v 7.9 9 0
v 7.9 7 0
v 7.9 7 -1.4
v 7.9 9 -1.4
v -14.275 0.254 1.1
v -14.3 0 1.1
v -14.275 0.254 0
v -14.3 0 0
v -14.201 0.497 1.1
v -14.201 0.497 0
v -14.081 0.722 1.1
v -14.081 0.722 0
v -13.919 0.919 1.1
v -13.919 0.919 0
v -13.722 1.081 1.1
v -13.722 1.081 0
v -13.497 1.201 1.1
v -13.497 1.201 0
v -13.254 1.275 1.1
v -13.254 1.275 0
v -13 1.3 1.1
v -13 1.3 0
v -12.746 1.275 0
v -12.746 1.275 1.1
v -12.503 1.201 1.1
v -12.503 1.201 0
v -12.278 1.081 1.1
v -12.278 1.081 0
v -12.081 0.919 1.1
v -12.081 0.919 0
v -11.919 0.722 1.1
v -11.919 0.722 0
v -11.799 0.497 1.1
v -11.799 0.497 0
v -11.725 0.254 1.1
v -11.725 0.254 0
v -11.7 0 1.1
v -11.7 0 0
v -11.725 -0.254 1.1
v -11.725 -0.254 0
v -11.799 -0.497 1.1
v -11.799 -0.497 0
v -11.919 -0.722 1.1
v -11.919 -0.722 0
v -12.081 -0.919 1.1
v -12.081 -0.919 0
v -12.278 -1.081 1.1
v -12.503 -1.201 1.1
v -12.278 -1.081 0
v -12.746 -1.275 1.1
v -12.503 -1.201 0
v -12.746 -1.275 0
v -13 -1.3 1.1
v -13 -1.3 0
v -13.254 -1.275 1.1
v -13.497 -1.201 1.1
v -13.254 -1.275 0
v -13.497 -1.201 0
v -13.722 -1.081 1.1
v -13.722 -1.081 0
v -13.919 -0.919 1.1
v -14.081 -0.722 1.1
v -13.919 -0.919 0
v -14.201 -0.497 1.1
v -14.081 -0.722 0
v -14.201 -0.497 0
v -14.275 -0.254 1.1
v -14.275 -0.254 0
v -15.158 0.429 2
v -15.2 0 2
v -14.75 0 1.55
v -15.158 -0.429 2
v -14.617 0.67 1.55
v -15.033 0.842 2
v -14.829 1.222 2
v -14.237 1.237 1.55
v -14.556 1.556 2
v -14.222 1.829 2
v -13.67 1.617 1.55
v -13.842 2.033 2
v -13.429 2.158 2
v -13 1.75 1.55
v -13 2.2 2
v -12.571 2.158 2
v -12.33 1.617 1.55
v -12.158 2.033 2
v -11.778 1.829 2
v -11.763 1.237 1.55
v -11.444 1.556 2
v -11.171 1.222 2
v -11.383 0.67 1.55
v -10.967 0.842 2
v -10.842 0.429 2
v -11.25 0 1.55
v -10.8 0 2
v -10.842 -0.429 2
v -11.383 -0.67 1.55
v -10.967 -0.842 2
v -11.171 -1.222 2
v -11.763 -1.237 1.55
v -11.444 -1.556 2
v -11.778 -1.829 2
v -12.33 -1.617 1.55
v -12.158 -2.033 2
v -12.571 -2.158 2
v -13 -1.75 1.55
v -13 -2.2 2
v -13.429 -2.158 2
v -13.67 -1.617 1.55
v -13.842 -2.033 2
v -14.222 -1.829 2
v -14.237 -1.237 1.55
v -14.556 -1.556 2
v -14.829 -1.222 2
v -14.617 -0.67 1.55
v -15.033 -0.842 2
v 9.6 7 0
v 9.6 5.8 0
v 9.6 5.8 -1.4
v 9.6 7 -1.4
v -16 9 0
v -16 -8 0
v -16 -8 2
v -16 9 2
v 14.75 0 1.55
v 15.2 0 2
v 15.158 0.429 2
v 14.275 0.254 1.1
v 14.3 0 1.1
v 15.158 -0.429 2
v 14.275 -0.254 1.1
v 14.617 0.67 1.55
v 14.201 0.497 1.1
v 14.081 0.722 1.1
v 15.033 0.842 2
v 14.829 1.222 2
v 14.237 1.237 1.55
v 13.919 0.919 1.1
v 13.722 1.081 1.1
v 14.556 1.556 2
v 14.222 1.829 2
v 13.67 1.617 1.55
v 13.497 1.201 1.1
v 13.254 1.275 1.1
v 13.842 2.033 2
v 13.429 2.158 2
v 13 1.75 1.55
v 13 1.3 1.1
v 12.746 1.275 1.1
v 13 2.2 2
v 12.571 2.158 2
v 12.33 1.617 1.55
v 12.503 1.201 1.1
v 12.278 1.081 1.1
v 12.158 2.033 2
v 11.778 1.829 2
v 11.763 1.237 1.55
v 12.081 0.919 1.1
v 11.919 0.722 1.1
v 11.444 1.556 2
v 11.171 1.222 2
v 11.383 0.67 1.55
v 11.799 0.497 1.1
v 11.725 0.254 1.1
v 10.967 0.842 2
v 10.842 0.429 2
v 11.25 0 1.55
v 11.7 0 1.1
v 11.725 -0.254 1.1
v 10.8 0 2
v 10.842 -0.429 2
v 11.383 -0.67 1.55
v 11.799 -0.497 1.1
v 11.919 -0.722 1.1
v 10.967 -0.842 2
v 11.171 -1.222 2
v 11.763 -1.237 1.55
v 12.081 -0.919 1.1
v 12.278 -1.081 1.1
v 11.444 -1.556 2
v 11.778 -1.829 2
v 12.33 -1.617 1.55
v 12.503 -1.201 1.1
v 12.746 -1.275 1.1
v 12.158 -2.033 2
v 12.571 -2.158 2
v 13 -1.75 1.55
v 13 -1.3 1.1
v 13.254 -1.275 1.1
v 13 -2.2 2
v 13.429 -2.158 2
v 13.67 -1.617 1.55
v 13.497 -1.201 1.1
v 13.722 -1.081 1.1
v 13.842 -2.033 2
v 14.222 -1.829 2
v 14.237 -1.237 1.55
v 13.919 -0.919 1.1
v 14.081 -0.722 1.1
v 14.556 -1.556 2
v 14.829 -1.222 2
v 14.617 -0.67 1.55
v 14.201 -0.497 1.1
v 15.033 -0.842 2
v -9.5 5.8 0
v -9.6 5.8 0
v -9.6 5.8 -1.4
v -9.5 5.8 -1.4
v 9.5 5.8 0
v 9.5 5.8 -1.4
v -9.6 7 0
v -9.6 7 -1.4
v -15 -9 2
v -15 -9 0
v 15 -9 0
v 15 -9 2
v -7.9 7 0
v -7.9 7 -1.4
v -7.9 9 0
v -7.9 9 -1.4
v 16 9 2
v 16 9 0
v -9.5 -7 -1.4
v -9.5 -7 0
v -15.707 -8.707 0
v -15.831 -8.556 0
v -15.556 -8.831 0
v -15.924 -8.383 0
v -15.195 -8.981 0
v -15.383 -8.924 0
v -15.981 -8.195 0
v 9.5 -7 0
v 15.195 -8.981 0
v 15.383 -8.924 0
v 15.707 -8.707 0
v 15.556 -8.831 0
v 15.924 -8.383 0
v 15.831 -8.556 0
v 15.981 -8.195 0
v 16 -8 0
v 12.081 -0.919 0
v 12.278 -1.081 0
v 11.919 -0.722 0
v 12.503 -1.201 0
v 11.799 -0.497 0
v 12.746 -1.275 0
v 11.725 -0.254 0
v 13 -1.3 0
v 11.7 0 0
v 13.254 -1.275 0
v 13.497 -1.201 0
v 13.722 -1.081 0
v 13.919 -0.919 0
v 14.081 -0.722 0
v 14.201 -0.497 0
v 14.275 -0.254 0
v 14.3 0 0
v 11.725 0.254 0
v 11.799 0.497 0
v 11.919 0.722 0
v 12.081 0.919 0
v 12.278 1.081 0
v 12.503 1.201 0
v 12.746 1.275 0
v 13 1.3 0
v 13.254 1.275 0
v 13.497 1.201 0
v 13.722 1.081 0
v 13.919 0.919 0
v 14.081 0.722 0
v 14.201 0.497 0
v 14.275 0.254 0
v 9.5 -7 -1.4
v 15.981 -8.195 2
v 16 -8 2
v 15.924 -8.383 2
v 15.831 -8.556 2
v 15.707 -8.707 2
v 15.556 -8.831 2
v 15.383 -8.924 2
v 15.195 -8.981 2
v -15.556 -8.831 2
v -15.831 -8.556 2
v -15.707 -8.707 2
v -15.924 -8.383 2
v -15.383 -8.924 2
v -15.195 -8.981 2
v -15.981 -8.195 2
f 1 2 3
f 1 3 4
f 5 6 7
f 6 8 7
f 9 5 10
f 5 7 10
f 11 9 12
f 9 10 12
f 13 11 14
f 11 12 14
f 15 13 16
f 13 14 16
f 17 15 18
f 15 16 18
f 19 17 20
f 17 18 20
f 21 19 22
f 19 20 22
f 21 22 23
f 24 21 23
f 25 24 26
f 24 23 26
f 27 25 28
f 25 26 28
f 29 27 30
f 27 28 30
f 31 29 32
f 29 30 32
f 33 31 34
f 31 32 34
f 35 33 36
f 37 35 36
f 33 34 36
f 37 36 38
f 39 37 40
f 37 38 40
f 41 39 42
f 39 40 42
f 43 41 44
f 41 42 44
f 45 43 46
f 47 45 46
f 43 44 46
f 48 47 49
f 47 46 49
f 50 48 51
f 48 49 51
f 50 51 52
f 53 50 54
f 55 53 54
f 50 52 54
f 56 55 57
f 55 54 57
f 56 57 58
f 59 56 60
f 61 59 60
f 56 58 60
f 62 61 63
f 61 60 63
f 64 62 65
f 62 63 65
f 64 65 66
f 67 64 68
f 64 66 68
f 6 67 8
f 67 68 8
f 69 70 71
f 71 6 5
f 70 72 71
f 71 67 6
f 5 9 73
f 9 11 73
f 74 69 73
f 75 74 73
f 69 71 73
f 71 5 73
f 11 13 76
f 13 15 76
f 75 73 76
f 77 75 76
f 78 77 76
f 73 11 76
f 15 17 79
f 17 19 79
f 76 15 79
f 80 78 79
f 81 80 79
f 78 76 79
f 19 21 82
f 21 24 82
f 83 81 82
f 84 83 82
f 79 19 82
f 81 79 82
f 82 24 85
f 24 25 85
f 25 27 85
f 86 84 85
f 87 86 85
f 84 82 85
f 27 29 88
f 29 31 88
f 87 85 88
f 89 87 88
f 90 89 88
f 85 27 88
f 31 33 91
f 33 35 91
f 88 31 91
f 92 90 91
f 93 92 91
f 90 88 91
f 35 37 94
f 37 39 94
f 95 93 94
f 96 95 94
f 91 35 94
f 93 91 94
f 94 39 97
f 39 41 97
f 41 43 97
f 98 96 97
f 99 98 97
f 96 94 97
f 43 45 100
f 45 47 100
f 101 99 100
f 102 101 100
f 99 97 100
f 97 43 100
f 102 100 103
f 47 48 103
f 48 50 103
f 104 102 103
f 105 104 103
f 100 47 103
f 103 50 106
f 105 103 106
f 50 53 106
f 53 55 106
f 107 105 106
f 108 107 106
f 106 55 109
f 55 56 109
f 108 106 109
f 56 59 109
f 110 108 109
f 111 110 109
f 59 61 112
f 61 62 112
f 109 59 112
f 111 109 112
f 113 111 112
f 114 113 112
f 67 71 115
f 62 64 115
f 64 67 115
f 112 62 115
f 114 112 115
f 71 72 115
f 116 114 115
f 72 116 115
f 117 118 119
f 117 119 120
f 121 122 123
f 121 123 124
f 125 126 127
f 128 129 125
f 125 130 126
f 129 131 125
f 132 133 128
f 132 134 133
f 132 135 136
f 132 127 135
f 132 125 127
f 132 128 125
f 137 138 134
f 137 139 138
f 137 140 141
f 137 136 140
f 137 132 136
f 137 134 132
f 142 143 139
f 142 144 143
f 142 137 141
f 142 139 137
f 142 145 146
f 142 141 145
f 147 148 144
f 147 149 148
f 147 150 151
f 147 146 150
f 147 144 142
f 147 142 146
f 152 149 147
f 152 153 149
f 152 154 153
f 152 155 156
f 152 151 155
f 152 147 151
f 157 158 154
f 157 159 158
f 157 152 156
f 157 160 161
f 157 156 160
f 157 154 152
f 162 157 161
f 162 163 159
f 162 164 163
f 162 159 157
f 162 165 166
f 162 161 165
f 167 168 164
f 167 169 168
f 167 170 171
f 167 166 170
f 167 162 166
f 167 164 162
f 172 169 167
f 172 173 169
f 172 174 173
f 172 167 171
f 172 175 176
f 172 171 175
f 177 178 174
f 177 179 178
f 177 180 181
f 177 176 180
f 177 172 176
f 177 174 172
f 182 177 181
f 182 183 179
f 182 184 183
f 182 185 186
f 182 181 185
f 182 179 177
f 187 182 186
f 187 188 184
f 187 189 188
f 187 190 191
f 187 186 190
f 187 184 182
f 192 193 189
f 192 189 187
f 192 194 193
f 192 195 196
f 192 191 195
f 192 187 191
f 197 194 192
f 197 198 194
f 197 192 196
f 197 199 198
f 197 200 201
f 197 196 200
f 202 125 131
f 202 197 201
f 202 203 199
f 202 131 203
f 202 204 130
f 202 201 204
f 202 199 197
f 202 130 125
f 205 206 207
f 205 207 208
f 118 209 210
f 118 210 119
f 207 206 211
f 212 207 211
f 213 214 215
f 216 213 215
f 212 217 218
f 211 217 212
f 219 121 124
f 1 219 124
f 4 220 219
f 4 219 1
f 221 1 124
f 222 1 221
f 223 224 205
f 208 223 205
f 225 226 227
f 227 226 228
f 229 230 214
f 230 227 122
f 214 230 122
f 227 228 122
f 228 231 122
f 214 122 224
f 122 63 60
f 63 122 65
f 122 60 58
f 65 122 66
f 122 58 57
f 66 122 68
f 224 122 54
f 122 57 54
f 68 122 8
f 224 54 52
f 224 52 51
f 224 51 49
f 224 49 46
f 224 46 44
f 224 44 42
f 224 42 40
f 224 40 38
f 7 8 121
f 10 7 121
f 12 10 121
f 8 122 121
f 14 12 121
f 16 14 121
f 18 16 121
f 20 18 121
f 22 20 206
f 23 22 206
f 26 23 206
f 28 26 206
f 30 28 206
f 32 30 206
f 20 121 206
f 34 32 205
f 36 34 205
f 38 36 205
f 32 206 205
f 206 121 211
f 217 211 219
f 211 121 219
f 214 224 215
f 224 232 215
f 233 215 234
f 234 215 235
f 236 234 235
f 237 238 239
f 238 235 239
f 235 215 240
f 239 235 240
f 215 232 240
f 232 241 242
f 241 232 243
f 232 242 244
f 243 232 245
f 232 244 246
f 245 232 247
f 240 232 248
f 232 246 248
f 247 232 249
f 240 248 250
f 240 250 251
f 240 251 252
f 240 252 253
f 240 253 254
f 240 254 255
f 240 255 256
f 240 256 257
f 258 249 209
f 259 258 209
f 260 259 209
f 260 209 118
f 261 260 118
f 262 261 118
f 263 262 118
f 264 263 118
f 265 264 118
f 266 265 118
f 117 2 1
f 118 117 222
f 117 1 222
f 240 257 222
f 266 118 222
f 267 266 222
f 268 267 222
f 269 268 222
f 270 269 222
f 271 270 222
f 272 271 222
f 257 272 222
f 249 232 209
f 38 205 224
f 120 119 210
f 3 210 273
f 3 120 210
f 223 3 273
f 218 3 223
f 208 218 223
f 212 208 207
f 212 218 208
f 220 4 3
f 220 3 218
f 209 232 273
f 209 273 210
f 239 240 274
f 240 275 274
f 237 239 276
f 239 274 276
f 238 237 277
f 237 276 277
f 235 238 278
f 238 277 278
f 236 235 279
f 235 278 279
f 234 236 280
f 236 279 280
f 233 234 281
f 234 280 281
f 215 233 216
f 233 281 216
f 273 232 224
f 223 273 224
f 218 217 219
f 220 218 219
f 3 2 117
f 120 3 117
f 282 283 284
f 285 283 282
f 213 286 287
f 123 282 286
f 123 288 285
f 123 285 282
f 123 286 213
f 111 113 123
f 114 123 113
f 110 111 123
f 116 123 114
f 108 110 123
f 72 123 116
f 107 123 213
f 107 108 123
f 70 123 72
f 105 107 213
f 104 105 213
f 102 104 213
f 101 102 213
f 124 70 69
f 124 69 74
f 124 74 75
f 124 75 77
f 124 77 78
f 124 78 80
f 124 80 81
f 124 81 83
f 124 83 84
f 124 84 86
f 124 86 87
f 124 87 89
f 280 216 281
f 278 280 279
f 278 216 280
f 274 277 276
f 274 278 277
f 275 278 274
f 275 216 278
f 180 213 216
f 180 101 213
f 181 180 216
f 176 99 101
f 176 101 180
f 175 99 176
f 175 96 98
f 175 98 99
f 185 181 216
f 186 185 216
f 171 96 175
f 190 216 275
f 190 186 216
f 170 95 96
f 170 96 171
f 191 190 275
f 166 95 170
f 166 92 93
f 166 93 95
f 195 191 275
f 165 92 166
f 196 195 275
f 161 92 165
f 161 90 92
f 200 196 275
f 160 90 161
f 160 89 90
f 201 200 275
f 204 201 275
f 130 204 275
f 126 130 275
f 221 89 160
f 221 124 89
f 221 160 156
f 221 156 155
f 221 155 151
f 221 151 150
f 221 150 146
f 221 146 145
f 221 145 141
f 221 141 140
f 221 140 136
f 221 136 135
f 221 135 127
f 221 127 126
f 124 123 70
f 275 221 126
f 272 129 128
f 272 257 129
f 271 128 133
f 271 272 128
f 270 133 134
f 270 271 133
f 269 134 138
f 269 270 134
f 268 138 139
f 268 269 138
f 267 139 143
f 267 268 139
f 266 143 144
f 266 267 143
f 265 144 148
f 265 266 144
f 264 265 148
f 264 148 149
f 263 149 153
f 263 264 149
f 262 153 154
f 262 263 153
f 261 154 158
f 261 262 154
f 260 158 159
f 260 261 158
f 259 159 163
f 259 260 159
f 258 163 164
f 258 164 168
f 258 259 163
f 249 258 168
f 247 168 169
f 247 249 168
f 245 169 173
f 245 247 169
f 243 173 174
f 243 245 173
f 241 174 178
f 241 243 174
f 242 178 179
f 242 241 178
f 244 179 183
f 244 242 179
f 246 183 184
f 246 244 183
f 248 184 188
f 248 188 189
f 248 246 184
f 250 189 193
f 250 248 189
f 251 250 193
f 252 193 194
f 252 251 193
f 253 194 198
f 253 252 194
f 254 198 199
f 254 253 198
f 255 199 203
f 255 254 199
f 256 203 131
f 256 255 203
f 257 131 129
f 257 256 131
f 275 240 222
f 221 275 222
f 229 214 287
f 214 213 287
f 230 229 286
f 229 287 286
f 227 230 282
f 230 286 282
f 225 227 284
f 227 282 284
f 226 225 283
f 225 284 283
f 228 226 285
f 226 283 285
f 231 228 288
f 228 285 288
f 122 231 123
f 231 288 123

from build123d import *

# Parameters (mm, degrees)
ESQUISSE1_W                                    = 32
ESQUISSE1_H                                    = 18
BOSS_EXTRU_1_DEPTH                             = 2
ESQUISSE2_W                                    = 19
ESQUISSE2_H                                    = 14
BOSS_EXTRU_2_DEPTH                             = 1.4
FRAISAGE_POUR_VIS_T_TE_FRAIS_E_M21_D           = 2.6
FRAISAGE_POUR_VIS_T_TE_FRAIS_E_M21_CSINK_D     = 4.4
FRAISAGE_POUR_VIS_T_TE_FRAIS_E_M21_CSINK_ANGLE = 90
ESQUISSE6_W                                    = 15.8
ESQUISSE6_H                                    = 2
BOSS_EXTRU_3_DEPTH                             = 1.4
ESQUISSE7_W                                    = 19.2
ESQUISSE7_H                                    = 1.2
BOSS_EXTRU_4_DEPTH                             = 3.4
CONG_7_R                                       = 1


with BuildPart() as part:
    # Esquisse1 → Boss.-Extru.1 (new body)
    with BuildSketch(Plane.XY):
        Rectangle(ESQUISSE1_W, ESQUISSE1_H)
    extrude(amount=BOSS_EXTRU_1_DEPTH)

    # Esquisse2 → Boss.-Extru.2 (add)
    with BuildSketch(Plane(origin=(0, 0, 0), x_dir=(-1, 0, 0), z_dir=(0, 0, -1))):
        Rectangle(ESQUISSE2_W, ESQUISSE2_H)
    extrude(amount=BOSS_EXTRU_2_DEPTH)

    # Fraisage pour vis à tête fraisée M21 (through all)
    with Locations(Plane.XY.offset(2)):
        with Locations((-13, 0)):
            fraisage_pour_vis_t_te_frais_e_m21 = CounterSinkHole(FRAISAGE_POUR_VIS_T_TE_FRAIS_E_M21_D / 2, FRAISAGE_POUR_VIS_T_TE_FRAIS_E_M21_CSINK_D / 2, counter_sink_angle=FRAISAGE_POUR_VIS_T_TE_FRAIS_E_M21_CSINK_ANGLE)

    # Symétrie1: Fraisage pour vis à tête fraisée M21 across plane
    add(fraisage_pour_vis_t_te_frais_e_m21.mirror(Plane(origin=(0, 0, 0), x_dir=(0, 0, 1), z_dir=(1, 0, 0))), mode=Mode.SUBTRACT)

    # Esquisse6 → Boss.-Extru.3 (add)
    with BuildSketch(Plane(origin=(0, 0, 0), x_dir=(-1, 0, 0), z_dir=(0, 0, -1))):
        with Locations((0, 8)):
            Rectangle(ESQUISSE6_W, ESQUISSE6_H)
    extrude(amount=BOSS_EXTRU_3_DEPTH)

    # Esquisse7 → Boss.-Extru.4 (add)
    with BuildSketch(Plane.XY.offset(2)):
        with Locations((0, 6.4)):
            Rectangle(ESQUISSE7_W, ESQUISSE7_H)
    extrude(amount=-BOSS_EXTRU_4_DEPTH)

    # Congé7
    cong_7_edges = [part.edges().sort_by_distance(p)[0] for p in [
        (16, -9, 1),
        (-16, -9, 1),
    ]]
    fillet(cong_7_edges, radius=CONG_7_R)


solid = part.part
